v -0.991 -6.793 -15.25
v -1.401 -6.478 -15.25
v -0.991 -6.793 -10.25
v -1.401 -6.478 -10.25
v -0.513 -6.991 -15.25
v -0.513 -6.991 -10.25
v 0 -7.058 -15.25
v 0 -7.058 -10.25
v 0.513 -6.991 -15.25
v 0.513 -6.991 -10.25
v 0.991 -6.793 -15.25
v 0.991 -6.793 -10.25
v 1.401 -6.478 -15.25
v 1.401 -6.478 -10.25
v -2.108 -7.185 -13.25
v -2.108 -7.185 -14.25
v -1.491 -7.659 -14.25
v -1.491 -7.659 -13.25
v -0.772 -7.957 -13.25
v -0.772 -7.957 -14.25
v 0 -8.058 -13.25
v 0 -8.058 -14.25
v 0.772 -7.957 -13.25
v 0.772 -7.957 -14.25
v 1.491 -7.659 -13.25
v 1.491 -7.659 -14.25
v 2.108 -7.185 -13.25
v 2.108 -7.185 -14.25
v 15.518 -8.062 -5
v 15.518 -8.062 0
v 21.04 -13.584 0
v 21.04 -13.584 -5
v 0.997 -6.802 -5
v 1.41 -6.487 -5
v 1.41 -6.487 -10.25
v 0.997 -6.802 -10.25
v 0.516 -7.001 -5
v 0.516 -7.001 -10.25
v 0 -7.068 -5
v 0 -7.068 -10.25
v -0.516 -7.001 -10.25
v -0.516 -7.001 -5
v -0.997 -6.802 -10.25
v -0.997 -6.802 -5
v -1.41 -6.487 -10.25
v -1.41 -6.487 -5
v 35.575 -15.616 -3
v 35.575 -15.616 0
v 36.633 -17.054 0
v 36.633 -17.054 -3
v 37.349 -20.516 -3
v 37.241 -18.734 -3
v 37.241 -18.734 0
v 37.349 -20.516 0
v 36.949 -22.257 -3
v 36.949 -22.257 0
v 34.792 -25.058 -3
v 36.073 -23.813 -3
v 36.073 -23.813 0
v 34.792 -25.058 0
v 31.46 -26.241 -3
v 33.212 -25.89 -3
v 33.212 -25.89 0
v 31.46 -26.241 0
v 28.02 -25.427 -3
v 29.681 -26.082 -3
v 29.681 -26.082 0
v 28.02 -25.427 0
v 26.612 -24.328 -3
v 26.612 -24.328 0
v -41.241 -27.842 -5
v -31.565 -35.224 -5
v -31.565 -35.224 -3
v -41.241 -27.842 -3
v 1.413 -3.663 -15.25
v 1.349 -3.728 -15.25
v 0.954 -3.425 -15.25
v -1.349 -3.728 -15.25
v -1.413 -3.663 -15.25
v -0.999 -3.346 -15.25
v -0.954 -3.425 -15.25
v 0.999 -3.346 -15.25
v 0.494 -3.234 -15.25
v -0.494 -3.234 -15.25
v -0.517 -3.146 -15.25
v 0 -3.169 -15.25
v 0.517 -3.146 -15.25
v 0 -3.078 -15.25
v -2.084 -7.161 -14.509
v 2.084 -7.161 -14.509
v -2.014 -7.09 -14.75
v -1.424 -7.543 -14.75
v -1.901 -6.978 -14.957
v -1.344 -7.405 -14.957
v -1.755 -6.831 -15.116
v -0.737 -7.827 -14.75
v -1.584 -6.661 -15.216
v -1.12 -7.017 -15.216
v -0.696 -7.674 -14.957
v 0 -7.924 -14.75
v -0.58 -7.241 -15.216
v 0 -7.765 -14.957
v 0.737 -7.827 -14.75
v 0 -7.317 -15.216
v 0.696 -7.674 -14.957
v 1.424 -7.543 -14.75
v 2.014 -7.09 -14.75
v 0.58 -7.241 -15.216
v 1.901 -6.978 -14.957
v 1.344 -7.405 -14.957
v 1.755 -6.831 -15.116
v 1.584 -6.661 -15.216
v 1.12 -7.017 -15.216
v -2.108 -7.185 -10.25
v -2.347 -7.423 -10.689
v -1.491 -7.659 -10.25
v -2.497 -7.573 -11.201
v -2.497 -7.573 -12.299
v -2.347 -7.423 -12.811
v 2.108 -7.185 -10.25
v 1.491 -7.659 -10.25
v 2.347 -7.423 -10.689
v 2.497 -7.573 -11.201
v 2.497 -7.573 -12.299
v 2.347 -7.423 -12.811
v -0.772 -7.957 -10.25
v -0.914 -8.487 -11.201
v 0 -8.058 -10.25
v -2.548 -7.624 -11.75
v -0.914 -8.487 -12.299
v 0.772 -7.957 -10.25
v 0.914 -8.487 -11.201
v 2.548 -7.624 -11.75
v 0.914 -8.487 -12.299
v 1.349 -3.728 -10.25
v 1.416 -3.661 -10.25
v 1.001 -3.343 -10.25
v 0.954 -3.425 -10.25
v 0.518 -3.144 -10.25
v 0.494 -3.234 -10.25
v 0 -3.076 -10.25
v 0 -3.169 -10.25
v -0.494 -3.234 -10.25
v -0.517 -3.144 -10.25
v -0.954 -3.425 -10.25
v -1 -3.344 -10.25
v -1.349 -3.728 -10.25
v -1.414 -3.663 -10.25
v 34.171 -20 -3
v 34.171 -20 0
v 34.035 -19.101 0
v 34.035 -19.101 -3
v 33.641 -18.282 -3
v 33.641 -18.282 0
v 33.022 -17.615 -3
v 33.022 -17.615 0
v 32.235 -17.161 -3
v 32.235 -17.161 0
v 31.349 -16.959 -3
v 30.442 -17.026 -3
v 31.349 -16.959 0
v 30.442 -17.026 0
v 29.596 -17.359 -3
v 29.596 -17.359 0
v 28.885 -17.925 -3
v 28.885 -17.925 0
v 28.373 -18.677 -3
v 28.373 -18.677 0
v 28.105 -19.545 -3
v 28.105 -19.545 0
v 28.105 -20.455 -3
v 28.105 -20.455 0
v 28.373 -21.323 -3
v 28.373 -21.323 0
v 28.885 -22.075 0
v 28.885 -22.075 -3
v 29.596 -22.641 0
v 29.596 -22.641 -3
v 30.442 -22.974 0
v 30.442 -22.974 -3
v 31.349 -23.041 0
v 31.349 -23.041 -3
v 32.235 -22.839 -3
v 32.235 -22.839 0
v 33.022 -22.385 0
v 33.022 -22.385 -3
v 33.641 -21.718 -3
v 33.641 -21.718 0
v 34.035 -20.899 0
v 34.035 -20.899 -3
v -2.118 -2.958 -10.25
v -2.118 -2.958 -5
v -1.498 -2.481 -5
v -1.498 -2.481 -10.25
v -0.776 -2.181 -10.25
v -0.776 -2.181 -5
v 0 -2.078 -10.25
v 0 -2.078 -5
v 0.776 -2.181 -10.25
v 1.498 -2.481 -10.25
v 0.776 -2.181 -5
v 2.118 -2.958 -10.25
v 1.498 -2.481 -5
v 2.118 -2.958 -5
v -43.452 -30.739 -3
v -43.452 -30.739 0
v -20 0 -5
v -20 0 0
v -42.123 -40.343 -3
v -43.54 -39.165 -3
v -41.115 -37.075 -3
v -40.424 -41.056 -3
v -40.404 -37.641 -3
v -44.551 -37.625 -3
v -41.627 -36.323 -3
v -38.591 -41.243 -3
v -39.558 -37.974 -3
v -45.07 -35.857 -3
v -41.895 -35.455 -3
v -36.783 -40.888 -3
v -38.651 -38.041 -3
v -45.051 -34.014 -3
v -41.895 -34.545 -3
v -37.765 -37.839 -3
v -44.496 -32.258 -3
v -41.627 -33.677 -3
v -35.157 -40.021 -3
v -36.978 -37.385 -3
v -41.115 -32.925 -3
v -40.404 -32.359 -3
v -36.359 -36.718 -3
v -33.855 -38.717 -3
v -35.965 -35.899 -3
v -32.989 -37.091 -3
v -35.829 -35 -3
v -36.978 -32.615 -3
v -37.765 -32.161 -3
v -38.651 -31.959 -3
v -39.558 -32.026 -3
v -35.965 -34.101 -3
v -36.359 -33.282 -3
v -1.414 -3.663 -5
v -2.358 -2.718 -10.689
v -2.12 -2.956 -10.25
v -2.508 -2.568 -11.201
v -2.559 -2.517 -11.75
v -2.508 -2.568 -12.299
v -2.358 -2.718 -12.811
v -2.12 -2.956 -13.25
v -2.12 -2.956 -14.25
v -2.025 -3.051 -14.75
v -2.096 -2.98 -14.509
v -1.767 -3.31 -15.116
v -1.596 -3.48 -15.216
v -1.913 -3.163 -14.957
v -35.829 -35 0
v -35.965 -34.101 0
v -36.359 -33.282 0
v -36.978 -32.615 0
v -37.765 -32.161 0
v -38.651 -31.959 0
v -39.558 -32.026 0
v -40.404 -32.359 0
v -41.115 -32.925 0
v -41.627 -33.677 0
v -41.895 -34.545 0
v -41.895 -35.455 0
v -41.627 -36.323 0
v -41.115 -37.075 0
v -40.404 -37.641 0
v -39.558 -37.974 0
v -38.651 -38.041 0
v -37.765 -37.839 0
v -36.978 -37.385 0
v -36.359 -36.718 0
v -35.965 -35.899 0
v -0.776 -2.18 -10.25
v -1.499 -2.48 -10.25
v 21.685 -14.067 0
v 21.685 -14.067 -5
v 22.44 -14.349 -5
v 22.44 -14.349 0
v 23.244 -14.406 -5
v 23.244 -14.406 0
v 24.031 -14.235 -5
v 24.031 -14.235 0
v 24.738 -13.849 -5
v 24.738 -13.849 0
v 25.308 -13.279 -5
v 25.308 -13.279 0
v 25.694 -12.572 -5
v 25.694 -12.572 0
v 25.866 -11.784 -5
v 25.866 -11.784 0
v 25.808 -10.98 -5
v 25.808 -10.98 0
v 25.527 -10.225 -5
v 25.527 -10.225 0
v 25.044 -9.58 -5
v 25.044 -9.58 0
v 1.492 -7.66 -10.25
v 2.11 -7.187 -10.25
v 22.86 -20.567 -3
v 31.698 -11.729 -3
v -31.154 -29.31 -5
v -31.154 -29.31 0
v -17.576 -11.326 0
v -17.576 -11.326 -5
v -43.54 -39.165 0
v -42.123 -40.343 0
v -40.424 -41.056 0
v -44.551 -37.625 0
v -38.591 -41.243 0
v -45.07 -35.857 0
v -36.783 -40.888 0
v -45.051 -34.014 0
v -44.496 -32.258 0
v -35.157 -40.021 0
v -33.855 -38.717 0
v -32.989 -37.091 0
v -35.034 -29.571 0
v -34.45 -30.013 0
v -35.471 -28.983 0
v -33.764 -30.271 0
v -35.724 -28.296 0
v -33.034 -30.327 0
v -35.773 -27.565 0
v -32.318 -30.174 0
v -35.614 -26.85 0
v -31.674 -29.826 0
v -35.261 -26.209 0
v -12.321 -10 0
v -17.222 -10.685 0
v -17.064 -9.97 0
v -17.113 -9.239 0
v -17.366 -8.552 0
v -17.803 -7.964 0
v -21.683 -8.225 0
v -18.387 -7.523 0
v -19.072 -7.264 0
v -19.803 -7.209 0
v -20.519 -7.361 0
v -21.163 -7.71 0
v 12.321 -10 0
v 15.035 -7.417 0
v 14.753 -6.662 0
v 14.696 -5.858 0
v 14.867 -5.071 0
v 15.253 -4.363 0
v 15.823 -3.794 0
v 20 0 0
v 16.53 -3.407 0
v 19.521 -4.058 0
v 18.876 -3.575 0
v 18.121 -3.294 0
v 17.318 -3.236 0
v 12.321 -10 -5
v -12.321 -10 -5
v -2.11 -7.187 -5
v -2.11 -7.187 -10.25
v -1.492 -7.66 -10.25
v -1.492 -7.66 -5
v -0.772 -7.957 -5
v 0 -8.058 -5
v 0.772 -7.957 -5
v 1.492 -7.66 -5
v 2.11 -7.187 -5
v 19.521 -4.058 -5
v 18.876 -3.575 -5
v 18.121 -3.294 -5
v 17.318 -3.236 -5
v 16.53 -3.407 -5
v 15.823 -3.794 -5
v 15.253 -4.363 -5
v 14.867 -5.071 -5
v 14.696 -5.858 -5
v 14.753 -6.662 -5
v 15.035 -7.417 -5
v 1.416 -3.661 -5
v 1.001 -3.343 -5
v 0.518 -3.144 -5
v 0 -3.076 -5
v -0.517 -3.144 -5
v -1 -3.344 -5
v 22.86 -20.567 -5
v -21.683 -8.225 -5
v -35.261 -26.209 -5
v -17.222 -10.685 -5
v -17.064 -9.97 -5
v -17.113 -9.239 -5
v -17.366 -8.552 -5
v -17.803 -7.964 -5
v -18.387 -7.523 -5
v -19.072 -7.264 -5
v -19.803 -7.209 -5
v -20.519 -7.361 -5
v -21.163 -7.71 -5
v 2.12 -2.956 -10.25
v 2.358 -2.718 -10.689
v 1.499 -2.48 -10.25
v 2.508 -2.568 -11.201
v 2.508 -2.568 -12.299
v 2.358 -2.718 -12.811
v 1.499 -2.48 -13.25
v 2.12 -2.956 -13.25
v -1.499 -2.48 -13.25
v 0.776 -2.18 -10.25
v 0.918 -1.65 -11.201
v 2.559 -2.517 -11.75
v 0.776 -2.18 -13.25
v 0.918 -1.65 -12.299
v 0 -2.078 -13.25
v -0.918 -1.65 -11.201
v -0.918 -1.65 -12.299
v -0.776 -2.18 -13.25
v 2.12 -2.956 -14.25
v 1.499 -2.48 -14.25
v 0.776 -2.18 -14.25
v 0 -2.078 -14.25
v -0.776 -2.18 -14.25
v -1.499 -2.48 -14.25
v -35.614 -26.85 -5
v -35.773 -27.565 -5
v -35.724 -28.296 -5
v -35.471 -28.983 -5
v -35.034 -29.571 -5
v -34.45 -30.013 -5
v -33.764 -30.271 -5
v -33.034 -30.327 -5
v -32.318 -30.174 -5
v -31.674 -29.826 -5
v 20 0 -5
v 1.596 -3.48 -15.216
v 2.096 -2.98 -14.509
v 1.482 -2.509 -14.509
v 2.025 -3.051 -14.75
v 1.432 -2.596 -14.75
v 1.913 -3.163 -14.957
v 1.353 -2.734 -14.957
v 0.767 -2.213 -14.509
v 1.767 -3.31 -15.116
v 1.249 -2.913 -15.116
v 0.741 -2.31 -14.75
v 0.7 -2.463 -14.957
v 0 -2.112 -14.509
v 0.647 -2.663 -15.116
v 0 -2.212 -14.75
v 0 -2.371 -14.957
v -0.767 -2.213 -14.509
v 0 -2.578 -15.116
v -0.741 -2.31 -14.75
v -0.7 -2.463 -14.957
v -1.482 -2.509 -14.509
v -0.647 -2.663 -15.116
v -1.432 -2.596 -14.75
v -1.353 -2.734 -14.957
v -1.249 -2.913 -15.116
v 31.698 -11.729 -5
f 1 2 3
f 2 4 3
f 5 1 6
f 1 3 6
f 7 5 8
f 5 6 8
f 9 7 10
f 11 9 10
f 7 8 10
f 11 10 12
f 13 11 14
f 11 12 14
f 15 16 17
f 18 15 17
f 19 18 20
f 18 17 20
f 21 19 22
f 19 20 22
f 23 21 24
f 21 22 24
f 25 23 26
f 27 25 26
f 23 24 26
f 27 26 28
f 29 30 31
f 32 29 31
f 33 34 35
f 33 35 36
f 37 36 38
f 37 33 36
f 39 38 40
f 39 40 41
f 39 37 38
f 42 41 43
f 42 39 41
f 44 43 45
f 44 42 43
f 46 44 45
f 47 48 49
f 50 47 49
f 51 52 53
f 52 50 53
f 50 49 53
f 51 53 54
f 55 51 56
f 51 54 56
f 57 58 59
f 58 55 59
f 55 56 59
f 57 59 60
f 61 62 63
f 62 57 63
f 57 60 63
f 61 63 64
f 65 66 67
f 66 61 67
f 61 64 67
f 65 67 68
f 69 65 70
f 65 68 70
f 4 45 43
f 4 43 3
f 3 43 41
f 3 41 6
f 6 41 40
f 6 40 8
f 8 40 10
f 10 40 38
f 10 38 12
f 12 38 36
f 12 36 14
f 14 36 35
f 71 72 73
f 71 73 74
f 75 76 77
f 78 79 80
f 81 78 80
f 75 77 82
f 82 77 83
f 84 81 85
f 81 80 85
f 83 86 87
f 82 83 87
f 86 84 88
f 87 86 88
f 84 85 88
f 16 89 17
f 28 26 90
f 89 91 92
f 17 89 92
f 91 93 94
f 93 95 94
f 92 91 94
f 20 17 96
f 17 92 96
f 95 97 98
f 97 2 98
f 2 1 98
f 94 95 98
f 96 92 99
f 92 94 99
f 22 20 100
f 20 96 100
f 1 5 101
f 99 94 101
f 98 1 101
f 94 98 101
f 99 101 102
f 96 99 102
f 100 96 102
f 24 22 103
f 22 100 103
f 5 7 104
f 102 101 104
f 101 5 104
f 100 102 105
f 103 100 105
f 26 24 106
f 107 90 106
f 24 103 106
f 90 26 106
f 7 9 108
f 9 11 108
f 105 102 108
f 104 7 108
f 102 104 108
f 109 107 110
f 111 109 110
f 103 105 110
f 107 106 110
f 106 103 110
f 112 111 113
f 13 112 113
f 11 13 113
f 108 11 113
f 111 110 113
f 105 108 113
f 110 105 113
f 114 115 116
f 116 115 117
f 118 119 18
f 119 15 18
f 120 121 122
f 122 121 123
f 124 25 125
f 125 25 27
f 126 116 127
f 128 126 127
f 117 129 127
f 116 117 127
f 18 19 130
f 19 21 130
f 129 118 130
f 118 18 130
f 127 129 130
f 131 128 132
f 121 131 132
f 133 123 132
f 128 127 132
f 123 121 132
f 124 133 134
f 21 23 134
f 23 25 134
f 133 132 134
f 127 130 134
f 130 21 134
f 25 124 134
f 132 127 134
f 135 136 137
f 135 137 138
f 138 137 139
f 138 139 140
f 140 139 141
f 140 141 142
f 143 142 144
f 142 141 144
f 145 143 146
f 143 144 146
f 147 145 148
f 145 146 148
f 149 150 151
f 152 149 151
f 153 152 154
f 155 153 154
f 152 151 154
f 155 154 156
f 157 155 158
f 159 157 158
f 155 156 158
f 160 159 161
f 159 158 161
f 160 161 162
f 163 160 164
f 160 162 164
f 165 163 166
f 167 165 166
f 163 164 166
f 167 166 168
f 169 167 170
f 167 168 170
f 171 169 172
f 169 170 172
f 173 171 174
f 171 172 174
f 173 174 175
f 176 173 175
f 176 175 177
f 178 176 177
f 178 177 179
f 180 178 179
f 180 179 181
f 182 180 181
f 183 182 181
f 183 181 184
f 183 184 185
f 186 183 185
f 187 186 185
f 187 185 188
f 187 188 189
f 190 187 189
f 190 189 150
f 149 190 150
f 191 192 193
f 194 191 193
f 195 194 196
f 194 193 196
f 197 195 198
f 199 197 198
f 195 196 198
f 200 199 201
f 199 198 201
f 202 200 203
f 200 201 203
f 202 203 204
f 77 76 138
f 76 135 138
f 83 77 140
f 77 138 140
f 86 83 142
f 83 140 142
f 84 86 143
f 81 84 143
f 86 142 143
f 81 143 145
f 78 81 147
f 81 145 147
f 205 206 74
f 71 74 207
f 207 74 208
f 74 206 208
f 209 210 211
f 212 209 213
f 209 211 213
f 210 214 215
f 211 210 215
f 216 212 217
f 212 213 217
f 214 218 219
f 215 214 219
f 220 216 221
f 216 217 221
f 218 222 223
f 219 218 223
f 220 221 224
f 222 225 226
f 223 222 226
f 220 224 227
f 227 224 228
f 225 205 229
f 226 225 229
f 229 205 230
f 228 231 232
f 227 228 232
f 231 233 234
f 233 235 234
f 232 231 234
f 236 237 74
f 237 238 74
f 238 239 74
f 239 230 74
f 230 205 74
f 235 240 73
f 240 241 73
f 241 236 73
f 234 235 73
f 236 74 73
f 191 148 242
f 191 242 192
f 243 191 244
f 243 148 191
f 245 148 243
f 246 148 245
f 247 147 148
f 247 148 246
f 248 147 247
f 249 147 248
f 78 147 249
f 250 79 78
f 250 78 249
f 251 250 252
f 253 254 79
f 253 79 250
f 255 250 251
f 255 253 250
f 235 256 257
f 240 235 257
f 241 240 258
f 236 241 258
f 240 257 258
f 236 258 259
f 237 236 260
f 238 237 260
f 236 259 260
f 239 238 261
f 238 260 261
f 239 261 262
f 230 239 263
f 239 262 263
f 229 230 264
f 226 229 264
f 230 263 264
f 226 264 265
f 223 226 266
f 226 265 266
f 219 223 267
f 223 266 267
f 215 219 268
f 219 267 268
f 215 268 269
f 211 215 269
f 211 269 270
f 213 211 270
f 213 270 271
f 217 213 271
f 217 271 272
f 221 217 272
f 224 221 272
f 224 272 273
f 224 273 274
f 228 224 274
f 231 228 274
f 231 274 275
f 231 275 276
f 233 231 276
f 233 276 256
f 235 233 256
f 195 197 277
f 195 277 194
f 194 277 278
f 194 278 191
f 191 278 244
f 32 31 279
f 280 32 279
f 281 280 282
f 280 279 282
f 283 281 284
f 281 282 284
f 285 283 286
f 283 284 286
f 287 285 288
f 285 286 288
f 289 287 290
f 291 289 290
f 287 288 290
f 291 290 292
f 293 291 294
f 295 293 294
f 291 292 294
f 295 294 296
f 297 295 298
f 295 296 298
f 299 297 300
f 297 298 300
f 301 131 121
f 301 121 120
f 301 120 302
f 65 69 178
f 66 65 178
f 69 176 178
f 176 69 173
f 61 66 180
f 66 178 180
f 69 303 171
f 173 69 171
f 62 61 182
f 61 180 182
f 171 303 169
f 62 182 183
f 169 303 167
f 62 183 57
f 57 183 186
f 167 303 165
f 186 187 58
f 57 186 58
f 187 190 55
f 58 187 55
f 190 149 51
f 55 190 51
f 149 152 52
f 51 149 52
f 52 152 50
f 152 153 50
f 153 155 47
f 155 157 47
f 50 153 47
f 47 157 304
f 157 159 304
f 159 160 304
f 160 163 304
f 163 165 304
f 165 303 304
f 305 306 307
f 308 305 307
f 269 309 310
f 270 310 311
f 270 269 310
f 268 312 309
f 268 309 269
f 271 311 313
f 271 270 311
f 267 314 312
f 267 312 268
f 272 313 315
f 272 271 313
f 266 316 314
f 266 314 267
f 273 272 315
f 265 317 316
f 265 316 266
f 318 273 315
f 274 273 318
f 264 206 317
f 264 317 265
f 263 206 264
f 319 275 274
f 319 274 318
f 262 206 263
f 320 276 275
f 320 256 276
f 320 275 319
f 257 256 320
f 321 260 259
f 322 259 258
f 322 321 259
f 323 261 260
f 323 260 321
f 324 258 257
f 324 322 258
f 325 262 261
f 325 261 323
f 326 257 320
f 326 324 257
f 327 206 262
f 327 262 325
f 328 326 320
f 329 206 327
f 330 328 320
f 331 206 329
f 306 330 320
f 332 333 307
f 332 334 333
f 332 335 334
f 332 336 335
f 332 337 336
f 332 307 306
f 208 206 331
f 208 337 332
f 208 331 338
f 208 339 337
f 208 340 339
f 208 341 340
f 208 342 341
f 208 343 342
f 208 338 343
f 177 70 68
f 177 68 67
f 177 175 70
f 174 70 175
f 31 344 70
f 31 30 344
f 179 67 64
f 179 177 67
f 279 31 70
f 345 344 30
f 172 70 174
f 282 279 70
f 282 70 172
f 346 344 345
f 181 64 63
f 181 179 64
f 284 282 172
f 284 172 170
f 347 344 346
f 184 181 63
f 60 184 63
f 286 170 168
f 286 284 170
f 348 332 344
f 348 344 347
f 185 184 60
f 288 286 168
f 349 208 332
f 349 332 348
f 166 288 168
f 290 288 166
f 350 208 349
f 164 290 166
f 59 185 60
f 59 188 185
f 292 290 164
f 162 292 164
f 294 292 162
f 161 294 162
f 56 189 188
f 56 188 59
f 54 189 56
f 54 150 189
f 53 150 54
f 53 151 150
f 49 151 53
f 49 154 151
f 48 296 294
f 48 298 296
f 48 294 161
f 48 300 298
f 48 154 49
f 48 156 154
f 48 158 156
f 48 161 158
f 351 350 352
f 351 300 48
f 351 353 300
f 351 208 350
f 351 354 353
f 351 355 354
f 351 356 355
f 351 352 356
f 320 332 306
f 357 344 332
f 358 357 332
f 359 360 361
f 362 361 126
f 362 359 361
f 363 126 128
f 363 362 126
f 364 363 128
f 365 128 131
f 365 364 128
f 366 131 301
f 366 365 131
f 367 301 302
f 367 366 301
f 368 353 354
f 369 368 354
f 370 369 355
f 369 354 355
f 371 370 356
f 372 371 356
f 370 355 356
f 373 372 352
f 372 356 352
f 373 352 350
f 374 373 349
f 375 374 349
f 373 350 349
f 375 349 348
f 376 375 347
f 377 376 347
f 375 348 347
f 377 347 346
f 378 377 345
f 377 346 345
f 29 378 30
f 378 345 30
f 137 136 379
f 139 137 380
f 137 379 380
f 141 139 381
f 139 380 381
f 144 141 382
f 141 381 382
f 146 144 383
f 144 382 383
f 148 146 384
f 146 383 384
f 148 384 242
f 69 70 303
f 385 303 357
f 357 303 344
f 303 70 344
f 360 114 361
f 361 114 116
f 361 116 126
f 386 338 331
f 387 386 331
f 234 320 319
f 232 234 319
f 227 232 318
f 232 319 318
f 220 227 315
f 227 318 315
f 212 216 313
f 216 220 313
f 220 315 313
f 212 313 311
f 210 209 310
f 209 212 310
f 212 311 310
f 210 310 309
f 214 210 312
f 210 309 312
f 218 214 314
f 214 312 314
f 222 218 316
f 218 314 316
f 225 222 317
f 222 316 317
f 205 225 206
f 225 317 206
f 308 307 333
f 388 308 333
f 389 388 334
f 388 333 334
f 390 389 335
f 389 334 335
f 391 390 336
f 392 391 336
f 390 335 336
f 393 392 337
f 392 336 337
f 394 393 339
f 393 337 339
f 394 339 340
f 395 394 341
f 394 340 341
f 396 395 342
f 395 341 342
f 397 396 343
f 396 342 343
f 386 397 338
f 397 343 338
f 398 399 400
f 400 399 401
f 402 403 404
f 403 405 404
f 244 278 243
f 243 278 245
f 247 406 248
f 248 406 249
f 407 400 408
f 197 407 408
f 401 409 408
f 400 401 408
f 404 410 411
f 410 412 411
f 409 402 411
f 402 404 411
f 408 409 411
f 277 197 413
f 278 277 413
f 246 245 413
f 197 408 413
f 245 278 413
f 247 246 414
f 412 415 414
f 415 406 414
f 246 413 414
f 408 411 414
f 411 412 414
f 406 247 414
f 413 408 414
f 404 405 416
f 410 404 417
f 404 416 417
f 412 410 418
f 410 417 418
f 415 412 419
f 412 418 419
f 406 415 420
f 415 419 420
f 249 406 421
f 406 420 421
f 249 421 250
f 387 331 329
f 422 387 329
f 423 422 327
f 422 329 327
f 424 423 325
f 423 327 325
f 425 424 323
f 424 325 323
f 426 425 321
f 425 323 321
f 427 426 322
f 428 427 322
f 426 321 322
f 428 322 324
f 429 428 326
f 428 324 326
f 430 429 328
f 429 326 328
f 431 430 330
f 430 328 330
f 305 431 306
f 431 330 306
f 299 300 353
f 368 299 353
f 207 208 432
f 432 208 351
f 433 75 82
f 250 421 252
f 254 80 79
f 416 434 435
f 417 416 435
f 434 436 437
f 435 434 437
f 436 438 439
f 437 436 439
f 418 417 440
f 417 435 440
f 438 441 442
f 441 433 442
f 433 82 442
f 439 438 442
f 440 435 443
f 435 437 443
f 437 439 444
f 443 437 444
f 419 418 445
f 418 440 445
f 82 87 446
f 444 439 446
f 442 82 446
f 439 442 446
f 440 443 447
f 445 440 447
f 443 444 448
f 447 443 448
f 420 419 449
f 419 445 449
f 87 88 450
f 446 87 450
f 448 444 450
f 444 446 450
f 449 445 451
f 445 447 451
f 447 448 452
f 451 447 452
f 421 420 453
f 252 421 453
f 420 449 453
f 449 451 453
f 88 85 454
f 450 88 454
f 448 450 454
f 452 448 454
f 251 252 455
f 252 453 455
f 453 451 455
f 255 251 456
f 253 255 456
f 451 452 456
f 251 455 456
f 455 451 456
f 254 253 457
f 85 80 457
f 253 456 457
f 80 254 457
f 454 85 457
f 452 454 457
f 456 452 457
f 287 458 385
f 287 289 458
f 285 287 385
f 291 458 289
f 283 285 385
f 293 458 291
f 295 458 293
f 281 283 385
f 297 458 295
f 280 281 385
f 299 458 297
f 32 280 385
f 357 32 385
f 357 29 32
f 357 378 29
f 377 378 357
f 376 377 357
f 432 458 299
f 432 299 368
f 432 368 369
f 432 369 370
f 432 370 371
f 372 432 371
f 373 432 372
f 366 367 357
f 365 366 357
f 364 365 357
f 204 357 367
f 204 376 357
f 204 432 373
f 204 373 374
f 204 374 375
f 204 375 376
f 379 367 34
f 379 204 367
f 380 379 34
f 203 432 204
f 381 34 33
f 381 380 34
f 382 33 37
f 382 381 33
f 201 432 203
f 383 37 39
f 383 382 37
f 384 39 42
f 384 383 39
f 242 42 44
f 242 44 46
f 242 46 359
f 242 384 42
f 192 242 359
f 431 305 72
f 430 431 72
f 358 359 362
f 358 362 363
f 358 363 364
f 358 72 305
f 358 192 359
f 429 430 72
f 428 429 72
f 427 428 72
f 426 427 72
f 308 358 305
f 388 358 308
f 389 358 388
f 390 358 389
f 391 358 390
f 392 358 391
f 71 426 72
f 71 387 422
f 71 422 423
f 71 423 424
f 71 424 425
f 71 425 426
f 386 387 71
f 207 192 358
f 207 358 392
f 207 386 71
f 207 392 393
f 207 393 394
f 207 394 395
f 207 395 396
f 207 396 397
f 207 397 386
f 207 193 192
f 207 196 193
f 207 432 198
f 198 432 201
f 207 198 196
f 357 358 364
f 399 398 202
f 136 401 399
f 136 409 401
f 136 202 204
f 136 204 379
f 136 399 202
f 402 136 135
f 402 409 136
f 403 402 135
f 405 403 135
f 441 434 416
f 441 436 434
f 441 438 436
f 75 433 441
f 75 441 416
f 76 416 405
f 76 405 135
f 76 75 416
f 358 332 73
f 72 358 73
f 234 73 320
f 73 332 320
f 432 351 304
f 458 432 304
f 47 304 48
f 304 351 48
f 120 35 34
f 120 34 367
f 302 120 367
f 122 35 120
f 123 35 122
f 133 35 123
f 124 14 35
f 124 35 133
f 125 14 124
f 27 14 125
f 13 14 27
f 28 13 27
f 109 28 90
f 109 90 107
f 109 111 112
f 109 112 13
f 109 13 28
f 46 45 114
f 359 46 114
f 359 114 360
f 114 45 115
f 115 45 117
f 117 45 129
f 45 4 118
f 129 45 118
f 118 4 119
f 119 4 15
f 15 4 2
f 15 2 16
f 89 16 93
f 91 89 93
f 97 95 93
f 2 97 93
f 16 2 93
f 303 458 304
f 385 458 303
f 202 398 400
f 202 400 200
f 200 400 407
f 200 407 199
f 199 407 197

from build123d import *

# Parameters (mm, degrees)
SZKIC1_R                    = 3.05
DODANIE_WYCI_GNI_CIE1_DEPTH = 5
WYTNIJ_WYCI_GNI_CIE2_DEPTH  = 10
WYTNIJ_WYCI_GNI_CIE4_DEPTH  = 10
DODANIE_WYCI_GNI_CIE2_DEPTH = 5.25
OBR_T1_ANGLE                = 90
OBR_T2_ANGLE                = 90
SZKIC8_W                    = 100.07426583
SZKIC8_H                    = 50.963746487
WYTNIJ_WYCI_GNI_CIE5_DEPTH  = 23
WYTNIJ_WYCI_GNI_CIE6_DEPTH  = 2
WYTNIJ_WYCI_GNI_CIE7_DEPTH  = 2
WYTNIJ_WYCI_GNI_CIE9_DEPTH  = 5.25
ZAOKR_GLENIE2_R             = 1


# Read off the part's stored shape, not the designer's step: Obrót1, Obrót2
with BuildPart() as part:
    # Szkic1 → Dodanie-wyciągnięcie1 (new body)
    with BuildSketch(Plane.XY):
        with BuildLine():
            Line((-20, 0), (20, 0))
            Line((20, 0), (35.574751144, -15.6155831))
            ThreePointArc((35.574751144, -15.6155831), (35.476976606, -24.481579544), (26.61176868, -24.328148016))
            Line((26.61176868, -24.328148016), (12.321086207, -10))
            Line((12.321086207, -10), (-12.321086207, -10))
            Line((-12.321086207, -10), (-32.989436275, -37.090675759))
            ThreePointArc((-32.989436275, -37.090675759), (-42.12272692, -40.342590816), (-43.451924108, -30.739196396))
            Line((-43.451924108, -30.739196396), (-20, 0))
        make_face()
        with Locations((-38.879391697, -35)):
            Circle(SZKIC1_R, mode=Mode.SUBTRACT)
        with Locations((31.120608303, -20)):
            Circle(SZKIC1_R, mode=Mode.SUBTRACT)
    dodanie_wyci_gni_cie1 = extrude(amount=DODANIE_WYCI_GNI_CIE1_DEPTH)

    # Szkic3 → Wytnij-wyciągnięcie2 (cut)
    with BuildSketch(Plane(origin=(0, 0, 0), x_dir=(-1, 0, 0), z_dir=(0, 0, -1))):
        with BuildLine():
            Line((21.683047095, -8.225427037), (35.260679995, -26.209046772))
            ThreePointArc((35.260679995, -26.209046772), (34.75757763, -29.812902485), (31.153721917, -29.309800121))
            Line((31.153721917, -29.309800121), (17.576089017, -11.326180386))
            ThreePointArc((17.576089017, -11.326180386), (18.079191382, -7.722324673), (21.683047095, -8.225427037))
        make_face()
    wytnij_wyci_gni_cie2 = extrude(amount=-WYTNIJ_WYCI_GNI_CIE2_DEPTH, mode=Mode.SUBTRACT)

    # Szkic4 → Wytnij-wyciągnięcie4 (cut)
    with BuildSketch(Plane(origin=(0, 0, 0), x_dir=(-1, 0, 0), z_dir=(0, 0, -1))):
        with BuildLine():
            Line((-15.517695436, -8.06176207), (-21.039997823, -13.584064457))
            ThreePointArc((-21.039997823, -13.584064457), (-25.043667053, -13.584064457), (-25.043667053, -9.580395227))
            Line((-25.043667053, -9.580395227), (-19.521364667, -4.05809284))
            ThreePointArc((-19.521364667, -4.05809284), (-15.517695436, -4.05809284), (-15.517695436, -8.06176207))
        make_face()
    wytnij_wyci_gni_cie4 = extrude(amount=-WYTNIJ_WYCI_GNI_CIE4_DEPTH, mode=Mode.SUBTRACT)

    # Szkic5 → Dodanie-wyciągnięcie2 (add)
    with BuildSketch(Plane.XY.offset(5)):
        with BuildLine():
            Line((-1.922496946, -4.528242282), (-2.878604971, -4.259692233))
            ThreePointArc((-2.878604971, -4.259692233), (0, -2.078230062), (2.878604971, -4.259692233))
            Line((2.878604971, -4.259692233), (1.925488275, -4.527402083))
            ThreePointArc((1.925488275, -4.527402083), (0.001178609, -3.075757991), (-1.922496946, -4.528242282))
        make_face()
        with BuildLine():
            Line((-1.925488275, -5.609058042), (-2.878604971, -5.876767892))
            ThreePointArc((-2.878604971, -5.876767892), (0, -8.058230062), (2.878604971, -5.876767892))
            Line((2.878604971, -5.876767892), (1.925488275, -5.609058042))
            ThreePointArc((1.925488275, -5.609058042), (0, -7.068230062), (-1.925488275, -5.609058042))
        make_face()
    dodanie_wyci_gni_cie2 = extrude(amount=DODANIE_WYCI_GNI_CIE2_DEPTH)

    # Obrót1 outline → Obrót1 (revolve)
    with BuildSketch(Plane(origin=(0, -5.076440198, 0), x_dir=(0.7071067811865502, 0.7071067811865448, 0), z_dir=(0.7071067811865448, -0.7071067811865502, 0))):
        with BuildLine():
            ThreePointArc((2.998210136, 10.25), (3.619530479, 11.75), (2.998210136, 13.25))
            Line((2.998210136, 13.25), (2.998210136, 15.25))
            Line((2.998210136, 15.25), (1.907479051, 15.25))
            Line((1.907479051, 15.25), (1.907479051, 10.25))
            Line((1.907479051, 10.25), (2.998210136, 10.25))
        make_face()
    obr_t1 = revolve(axis=Axis((0, -5.076440198, 0), (0, 0, 1)), revolution_arc=OBR_T1_ANGLE)

    # Obrót2 outline → Obrót2 (revolve)
    with BuildSketch(Plane(origin=(0, -5.076440198, 0), x_dir=(-0.7071067811865493, -0.7071067811865457, 0), z_dir=(-0.7071067811865457, 0.7071067811865493, 0))):
        with BuildLine():
            Line((1.981789864, 15.25), (1.981789864, 10.25))
            Line((1.981789864, 10.25), (2.981789864, 10.25))
            ThreePointArc((2.981789864, 10.25), (3.603110208, 11.75), (2.981789864, 13.25))
            Line((2.981789864, 13.25), (2.981789864, 15.25))
            Line((2.981789864, 15.25), (1.981789864, 15.25))
        make_face()
    obr_t2 = revolve(axis=Axis((0, -5.076440198, 0), (0, 0, 1)), revolution_arc=OBR_T2_ANGLE)

    # Lustro4: Dodanie-wyciągnięcie1, Wytnij-wyciągnięcie2, Wytnij-wyciągnięcie4, Dodanie-wyciągnięcie2, Obrót1, Obrót2 across plane
    add(dodanie_wyci_gni_cie1.mirror(Plane(origin=(-38.879391697, -35, 0), x_dir=(1, 0, 0), z_dir=(0, 0, 1))))
    add(wytnij_wyci_gni_cie2.mirror(Plane(origin=(-38.879391697, -35, 0), x_dir=(1, 0, 0), z_dir=(0, 0, 1))), mode=Mode.SUBTRACT)
    add(wytnij_wyci_gni_cie4.mirror(Plane(origin=(-38.879391697, -35, 0), x_dir=(1, 0, 0), z_dir=(0, 0, 1))), mode=Mode.SUBTRACT)
    add(dodanie_wyci_gni_cie2.mirror(Plane(origin=(-38.879391697, -35, 0), x_dir=(1, 0, 0), z_dir=(0, 0, 1))))
    add(obr_t1.mirror(Plane(origin=(-38.879391697, -35, 0), x_dir=(1, 0, 0), z_dir=(0, 0, 1))))
    add(obr_t2.mirror(Plane(origin=(-38.879391697, -35, 0), x_dir=(1, 0, 0), z_dir=(0, 0, 1))))

    # Szkic8 → Wytnij-wyciągnięcie5 (cut)
    with BuildSketch(Plane.XY):
        with Locations((-3.506949348, -18.717463345)):
            Rectangle(SZKIC8_W, SZKIC8_H)
    extrude(amount=WYTNIJ_WYCI_GNI_CIE5_DEPTH, mode=Mode.SUBTRACT)

    # Szkic9 → Wytnij-wyciągnięcie6 (cut)
    with BuildSketch(Plane.XY.offset(-5)):
        Polygon((33.793576108, -9.633416266), (20.924371092, -22.502621281), (34.229820345, -35.808070534), (47.099025361, -22.938865519), align=None)
    extrude(amount=WYTNIJ_WYCI_GNI_CIE6_DEPTH, mode=Mode.SUBTRACT)

    # Szkic10 → Wytnij-wyciągnięcie7 (cut)
    with BuildSketch(Plane.XY.offset(-5)):
        Polygon((-30.537850877, -36.007651395), (-42.082921385, -27.199544837), (-48.802909893, -36.007651395), (-37.257839386, -44.815757953), align=None)
    extrude(amount=WYTNIJ_WYCI_GNI_CIE7_DEPTH, mode=Mode.SUBTRACT)

    # Szkic14 → Wytnij-wyciągnięcie9 (cut)
    with BuildSketch(Plane(origin=(0, 0, -10.25), x_dir=(-1, 0, 0), z_dir=(0, 0, -1))):
        with BuildLine():
            Line((-2.559394547, -2.517045651), (-1.348791372, -3.727648826))
            Line((-1.348791372, -3.727648826), (1.348791372, -3.727648826))
            Line((1.348791372, -3.727648826), (2.559394547, -2.517045651))
            ThreePointArc((2.559394547, -2.517045651), (3.408337444, -5.072577978), (2.547783661, -7.624223859))
            Line((2.547783661, -7.624223859), (1.410102537, -6.486542735))
            Line((1.410102537, -6.486542735), (-1.410102537, -6.486542735))
            Line((-1.410102537, -6.486542735), (-2.547783661, -7.624223859))
            ThreePointArc((-2.547783661, -7.624223859), (-3.611320344, -5.073039448), (-2.559394547, -2.517045651))
        make_face()
    extrude(amount=-WYTNIJ_WYCI_GNI_CIE9_DEPTH, mode=Mode.SUBTRACT)

    # Zaokrąglenie2
    zaokr_glenie2_edges = [part.edges().sort_by_distance(p)[0] for p in [
        (0, -2.078230062, -15.25),
        (0, -8.058230062, -15.25),
    ]]
    fillet(zaokr_glenie2_edges, radius=ZAOKR_GLENIE2_R - 0.0001)  # a hair under: the kernel refuses the full size


solid = part.part
